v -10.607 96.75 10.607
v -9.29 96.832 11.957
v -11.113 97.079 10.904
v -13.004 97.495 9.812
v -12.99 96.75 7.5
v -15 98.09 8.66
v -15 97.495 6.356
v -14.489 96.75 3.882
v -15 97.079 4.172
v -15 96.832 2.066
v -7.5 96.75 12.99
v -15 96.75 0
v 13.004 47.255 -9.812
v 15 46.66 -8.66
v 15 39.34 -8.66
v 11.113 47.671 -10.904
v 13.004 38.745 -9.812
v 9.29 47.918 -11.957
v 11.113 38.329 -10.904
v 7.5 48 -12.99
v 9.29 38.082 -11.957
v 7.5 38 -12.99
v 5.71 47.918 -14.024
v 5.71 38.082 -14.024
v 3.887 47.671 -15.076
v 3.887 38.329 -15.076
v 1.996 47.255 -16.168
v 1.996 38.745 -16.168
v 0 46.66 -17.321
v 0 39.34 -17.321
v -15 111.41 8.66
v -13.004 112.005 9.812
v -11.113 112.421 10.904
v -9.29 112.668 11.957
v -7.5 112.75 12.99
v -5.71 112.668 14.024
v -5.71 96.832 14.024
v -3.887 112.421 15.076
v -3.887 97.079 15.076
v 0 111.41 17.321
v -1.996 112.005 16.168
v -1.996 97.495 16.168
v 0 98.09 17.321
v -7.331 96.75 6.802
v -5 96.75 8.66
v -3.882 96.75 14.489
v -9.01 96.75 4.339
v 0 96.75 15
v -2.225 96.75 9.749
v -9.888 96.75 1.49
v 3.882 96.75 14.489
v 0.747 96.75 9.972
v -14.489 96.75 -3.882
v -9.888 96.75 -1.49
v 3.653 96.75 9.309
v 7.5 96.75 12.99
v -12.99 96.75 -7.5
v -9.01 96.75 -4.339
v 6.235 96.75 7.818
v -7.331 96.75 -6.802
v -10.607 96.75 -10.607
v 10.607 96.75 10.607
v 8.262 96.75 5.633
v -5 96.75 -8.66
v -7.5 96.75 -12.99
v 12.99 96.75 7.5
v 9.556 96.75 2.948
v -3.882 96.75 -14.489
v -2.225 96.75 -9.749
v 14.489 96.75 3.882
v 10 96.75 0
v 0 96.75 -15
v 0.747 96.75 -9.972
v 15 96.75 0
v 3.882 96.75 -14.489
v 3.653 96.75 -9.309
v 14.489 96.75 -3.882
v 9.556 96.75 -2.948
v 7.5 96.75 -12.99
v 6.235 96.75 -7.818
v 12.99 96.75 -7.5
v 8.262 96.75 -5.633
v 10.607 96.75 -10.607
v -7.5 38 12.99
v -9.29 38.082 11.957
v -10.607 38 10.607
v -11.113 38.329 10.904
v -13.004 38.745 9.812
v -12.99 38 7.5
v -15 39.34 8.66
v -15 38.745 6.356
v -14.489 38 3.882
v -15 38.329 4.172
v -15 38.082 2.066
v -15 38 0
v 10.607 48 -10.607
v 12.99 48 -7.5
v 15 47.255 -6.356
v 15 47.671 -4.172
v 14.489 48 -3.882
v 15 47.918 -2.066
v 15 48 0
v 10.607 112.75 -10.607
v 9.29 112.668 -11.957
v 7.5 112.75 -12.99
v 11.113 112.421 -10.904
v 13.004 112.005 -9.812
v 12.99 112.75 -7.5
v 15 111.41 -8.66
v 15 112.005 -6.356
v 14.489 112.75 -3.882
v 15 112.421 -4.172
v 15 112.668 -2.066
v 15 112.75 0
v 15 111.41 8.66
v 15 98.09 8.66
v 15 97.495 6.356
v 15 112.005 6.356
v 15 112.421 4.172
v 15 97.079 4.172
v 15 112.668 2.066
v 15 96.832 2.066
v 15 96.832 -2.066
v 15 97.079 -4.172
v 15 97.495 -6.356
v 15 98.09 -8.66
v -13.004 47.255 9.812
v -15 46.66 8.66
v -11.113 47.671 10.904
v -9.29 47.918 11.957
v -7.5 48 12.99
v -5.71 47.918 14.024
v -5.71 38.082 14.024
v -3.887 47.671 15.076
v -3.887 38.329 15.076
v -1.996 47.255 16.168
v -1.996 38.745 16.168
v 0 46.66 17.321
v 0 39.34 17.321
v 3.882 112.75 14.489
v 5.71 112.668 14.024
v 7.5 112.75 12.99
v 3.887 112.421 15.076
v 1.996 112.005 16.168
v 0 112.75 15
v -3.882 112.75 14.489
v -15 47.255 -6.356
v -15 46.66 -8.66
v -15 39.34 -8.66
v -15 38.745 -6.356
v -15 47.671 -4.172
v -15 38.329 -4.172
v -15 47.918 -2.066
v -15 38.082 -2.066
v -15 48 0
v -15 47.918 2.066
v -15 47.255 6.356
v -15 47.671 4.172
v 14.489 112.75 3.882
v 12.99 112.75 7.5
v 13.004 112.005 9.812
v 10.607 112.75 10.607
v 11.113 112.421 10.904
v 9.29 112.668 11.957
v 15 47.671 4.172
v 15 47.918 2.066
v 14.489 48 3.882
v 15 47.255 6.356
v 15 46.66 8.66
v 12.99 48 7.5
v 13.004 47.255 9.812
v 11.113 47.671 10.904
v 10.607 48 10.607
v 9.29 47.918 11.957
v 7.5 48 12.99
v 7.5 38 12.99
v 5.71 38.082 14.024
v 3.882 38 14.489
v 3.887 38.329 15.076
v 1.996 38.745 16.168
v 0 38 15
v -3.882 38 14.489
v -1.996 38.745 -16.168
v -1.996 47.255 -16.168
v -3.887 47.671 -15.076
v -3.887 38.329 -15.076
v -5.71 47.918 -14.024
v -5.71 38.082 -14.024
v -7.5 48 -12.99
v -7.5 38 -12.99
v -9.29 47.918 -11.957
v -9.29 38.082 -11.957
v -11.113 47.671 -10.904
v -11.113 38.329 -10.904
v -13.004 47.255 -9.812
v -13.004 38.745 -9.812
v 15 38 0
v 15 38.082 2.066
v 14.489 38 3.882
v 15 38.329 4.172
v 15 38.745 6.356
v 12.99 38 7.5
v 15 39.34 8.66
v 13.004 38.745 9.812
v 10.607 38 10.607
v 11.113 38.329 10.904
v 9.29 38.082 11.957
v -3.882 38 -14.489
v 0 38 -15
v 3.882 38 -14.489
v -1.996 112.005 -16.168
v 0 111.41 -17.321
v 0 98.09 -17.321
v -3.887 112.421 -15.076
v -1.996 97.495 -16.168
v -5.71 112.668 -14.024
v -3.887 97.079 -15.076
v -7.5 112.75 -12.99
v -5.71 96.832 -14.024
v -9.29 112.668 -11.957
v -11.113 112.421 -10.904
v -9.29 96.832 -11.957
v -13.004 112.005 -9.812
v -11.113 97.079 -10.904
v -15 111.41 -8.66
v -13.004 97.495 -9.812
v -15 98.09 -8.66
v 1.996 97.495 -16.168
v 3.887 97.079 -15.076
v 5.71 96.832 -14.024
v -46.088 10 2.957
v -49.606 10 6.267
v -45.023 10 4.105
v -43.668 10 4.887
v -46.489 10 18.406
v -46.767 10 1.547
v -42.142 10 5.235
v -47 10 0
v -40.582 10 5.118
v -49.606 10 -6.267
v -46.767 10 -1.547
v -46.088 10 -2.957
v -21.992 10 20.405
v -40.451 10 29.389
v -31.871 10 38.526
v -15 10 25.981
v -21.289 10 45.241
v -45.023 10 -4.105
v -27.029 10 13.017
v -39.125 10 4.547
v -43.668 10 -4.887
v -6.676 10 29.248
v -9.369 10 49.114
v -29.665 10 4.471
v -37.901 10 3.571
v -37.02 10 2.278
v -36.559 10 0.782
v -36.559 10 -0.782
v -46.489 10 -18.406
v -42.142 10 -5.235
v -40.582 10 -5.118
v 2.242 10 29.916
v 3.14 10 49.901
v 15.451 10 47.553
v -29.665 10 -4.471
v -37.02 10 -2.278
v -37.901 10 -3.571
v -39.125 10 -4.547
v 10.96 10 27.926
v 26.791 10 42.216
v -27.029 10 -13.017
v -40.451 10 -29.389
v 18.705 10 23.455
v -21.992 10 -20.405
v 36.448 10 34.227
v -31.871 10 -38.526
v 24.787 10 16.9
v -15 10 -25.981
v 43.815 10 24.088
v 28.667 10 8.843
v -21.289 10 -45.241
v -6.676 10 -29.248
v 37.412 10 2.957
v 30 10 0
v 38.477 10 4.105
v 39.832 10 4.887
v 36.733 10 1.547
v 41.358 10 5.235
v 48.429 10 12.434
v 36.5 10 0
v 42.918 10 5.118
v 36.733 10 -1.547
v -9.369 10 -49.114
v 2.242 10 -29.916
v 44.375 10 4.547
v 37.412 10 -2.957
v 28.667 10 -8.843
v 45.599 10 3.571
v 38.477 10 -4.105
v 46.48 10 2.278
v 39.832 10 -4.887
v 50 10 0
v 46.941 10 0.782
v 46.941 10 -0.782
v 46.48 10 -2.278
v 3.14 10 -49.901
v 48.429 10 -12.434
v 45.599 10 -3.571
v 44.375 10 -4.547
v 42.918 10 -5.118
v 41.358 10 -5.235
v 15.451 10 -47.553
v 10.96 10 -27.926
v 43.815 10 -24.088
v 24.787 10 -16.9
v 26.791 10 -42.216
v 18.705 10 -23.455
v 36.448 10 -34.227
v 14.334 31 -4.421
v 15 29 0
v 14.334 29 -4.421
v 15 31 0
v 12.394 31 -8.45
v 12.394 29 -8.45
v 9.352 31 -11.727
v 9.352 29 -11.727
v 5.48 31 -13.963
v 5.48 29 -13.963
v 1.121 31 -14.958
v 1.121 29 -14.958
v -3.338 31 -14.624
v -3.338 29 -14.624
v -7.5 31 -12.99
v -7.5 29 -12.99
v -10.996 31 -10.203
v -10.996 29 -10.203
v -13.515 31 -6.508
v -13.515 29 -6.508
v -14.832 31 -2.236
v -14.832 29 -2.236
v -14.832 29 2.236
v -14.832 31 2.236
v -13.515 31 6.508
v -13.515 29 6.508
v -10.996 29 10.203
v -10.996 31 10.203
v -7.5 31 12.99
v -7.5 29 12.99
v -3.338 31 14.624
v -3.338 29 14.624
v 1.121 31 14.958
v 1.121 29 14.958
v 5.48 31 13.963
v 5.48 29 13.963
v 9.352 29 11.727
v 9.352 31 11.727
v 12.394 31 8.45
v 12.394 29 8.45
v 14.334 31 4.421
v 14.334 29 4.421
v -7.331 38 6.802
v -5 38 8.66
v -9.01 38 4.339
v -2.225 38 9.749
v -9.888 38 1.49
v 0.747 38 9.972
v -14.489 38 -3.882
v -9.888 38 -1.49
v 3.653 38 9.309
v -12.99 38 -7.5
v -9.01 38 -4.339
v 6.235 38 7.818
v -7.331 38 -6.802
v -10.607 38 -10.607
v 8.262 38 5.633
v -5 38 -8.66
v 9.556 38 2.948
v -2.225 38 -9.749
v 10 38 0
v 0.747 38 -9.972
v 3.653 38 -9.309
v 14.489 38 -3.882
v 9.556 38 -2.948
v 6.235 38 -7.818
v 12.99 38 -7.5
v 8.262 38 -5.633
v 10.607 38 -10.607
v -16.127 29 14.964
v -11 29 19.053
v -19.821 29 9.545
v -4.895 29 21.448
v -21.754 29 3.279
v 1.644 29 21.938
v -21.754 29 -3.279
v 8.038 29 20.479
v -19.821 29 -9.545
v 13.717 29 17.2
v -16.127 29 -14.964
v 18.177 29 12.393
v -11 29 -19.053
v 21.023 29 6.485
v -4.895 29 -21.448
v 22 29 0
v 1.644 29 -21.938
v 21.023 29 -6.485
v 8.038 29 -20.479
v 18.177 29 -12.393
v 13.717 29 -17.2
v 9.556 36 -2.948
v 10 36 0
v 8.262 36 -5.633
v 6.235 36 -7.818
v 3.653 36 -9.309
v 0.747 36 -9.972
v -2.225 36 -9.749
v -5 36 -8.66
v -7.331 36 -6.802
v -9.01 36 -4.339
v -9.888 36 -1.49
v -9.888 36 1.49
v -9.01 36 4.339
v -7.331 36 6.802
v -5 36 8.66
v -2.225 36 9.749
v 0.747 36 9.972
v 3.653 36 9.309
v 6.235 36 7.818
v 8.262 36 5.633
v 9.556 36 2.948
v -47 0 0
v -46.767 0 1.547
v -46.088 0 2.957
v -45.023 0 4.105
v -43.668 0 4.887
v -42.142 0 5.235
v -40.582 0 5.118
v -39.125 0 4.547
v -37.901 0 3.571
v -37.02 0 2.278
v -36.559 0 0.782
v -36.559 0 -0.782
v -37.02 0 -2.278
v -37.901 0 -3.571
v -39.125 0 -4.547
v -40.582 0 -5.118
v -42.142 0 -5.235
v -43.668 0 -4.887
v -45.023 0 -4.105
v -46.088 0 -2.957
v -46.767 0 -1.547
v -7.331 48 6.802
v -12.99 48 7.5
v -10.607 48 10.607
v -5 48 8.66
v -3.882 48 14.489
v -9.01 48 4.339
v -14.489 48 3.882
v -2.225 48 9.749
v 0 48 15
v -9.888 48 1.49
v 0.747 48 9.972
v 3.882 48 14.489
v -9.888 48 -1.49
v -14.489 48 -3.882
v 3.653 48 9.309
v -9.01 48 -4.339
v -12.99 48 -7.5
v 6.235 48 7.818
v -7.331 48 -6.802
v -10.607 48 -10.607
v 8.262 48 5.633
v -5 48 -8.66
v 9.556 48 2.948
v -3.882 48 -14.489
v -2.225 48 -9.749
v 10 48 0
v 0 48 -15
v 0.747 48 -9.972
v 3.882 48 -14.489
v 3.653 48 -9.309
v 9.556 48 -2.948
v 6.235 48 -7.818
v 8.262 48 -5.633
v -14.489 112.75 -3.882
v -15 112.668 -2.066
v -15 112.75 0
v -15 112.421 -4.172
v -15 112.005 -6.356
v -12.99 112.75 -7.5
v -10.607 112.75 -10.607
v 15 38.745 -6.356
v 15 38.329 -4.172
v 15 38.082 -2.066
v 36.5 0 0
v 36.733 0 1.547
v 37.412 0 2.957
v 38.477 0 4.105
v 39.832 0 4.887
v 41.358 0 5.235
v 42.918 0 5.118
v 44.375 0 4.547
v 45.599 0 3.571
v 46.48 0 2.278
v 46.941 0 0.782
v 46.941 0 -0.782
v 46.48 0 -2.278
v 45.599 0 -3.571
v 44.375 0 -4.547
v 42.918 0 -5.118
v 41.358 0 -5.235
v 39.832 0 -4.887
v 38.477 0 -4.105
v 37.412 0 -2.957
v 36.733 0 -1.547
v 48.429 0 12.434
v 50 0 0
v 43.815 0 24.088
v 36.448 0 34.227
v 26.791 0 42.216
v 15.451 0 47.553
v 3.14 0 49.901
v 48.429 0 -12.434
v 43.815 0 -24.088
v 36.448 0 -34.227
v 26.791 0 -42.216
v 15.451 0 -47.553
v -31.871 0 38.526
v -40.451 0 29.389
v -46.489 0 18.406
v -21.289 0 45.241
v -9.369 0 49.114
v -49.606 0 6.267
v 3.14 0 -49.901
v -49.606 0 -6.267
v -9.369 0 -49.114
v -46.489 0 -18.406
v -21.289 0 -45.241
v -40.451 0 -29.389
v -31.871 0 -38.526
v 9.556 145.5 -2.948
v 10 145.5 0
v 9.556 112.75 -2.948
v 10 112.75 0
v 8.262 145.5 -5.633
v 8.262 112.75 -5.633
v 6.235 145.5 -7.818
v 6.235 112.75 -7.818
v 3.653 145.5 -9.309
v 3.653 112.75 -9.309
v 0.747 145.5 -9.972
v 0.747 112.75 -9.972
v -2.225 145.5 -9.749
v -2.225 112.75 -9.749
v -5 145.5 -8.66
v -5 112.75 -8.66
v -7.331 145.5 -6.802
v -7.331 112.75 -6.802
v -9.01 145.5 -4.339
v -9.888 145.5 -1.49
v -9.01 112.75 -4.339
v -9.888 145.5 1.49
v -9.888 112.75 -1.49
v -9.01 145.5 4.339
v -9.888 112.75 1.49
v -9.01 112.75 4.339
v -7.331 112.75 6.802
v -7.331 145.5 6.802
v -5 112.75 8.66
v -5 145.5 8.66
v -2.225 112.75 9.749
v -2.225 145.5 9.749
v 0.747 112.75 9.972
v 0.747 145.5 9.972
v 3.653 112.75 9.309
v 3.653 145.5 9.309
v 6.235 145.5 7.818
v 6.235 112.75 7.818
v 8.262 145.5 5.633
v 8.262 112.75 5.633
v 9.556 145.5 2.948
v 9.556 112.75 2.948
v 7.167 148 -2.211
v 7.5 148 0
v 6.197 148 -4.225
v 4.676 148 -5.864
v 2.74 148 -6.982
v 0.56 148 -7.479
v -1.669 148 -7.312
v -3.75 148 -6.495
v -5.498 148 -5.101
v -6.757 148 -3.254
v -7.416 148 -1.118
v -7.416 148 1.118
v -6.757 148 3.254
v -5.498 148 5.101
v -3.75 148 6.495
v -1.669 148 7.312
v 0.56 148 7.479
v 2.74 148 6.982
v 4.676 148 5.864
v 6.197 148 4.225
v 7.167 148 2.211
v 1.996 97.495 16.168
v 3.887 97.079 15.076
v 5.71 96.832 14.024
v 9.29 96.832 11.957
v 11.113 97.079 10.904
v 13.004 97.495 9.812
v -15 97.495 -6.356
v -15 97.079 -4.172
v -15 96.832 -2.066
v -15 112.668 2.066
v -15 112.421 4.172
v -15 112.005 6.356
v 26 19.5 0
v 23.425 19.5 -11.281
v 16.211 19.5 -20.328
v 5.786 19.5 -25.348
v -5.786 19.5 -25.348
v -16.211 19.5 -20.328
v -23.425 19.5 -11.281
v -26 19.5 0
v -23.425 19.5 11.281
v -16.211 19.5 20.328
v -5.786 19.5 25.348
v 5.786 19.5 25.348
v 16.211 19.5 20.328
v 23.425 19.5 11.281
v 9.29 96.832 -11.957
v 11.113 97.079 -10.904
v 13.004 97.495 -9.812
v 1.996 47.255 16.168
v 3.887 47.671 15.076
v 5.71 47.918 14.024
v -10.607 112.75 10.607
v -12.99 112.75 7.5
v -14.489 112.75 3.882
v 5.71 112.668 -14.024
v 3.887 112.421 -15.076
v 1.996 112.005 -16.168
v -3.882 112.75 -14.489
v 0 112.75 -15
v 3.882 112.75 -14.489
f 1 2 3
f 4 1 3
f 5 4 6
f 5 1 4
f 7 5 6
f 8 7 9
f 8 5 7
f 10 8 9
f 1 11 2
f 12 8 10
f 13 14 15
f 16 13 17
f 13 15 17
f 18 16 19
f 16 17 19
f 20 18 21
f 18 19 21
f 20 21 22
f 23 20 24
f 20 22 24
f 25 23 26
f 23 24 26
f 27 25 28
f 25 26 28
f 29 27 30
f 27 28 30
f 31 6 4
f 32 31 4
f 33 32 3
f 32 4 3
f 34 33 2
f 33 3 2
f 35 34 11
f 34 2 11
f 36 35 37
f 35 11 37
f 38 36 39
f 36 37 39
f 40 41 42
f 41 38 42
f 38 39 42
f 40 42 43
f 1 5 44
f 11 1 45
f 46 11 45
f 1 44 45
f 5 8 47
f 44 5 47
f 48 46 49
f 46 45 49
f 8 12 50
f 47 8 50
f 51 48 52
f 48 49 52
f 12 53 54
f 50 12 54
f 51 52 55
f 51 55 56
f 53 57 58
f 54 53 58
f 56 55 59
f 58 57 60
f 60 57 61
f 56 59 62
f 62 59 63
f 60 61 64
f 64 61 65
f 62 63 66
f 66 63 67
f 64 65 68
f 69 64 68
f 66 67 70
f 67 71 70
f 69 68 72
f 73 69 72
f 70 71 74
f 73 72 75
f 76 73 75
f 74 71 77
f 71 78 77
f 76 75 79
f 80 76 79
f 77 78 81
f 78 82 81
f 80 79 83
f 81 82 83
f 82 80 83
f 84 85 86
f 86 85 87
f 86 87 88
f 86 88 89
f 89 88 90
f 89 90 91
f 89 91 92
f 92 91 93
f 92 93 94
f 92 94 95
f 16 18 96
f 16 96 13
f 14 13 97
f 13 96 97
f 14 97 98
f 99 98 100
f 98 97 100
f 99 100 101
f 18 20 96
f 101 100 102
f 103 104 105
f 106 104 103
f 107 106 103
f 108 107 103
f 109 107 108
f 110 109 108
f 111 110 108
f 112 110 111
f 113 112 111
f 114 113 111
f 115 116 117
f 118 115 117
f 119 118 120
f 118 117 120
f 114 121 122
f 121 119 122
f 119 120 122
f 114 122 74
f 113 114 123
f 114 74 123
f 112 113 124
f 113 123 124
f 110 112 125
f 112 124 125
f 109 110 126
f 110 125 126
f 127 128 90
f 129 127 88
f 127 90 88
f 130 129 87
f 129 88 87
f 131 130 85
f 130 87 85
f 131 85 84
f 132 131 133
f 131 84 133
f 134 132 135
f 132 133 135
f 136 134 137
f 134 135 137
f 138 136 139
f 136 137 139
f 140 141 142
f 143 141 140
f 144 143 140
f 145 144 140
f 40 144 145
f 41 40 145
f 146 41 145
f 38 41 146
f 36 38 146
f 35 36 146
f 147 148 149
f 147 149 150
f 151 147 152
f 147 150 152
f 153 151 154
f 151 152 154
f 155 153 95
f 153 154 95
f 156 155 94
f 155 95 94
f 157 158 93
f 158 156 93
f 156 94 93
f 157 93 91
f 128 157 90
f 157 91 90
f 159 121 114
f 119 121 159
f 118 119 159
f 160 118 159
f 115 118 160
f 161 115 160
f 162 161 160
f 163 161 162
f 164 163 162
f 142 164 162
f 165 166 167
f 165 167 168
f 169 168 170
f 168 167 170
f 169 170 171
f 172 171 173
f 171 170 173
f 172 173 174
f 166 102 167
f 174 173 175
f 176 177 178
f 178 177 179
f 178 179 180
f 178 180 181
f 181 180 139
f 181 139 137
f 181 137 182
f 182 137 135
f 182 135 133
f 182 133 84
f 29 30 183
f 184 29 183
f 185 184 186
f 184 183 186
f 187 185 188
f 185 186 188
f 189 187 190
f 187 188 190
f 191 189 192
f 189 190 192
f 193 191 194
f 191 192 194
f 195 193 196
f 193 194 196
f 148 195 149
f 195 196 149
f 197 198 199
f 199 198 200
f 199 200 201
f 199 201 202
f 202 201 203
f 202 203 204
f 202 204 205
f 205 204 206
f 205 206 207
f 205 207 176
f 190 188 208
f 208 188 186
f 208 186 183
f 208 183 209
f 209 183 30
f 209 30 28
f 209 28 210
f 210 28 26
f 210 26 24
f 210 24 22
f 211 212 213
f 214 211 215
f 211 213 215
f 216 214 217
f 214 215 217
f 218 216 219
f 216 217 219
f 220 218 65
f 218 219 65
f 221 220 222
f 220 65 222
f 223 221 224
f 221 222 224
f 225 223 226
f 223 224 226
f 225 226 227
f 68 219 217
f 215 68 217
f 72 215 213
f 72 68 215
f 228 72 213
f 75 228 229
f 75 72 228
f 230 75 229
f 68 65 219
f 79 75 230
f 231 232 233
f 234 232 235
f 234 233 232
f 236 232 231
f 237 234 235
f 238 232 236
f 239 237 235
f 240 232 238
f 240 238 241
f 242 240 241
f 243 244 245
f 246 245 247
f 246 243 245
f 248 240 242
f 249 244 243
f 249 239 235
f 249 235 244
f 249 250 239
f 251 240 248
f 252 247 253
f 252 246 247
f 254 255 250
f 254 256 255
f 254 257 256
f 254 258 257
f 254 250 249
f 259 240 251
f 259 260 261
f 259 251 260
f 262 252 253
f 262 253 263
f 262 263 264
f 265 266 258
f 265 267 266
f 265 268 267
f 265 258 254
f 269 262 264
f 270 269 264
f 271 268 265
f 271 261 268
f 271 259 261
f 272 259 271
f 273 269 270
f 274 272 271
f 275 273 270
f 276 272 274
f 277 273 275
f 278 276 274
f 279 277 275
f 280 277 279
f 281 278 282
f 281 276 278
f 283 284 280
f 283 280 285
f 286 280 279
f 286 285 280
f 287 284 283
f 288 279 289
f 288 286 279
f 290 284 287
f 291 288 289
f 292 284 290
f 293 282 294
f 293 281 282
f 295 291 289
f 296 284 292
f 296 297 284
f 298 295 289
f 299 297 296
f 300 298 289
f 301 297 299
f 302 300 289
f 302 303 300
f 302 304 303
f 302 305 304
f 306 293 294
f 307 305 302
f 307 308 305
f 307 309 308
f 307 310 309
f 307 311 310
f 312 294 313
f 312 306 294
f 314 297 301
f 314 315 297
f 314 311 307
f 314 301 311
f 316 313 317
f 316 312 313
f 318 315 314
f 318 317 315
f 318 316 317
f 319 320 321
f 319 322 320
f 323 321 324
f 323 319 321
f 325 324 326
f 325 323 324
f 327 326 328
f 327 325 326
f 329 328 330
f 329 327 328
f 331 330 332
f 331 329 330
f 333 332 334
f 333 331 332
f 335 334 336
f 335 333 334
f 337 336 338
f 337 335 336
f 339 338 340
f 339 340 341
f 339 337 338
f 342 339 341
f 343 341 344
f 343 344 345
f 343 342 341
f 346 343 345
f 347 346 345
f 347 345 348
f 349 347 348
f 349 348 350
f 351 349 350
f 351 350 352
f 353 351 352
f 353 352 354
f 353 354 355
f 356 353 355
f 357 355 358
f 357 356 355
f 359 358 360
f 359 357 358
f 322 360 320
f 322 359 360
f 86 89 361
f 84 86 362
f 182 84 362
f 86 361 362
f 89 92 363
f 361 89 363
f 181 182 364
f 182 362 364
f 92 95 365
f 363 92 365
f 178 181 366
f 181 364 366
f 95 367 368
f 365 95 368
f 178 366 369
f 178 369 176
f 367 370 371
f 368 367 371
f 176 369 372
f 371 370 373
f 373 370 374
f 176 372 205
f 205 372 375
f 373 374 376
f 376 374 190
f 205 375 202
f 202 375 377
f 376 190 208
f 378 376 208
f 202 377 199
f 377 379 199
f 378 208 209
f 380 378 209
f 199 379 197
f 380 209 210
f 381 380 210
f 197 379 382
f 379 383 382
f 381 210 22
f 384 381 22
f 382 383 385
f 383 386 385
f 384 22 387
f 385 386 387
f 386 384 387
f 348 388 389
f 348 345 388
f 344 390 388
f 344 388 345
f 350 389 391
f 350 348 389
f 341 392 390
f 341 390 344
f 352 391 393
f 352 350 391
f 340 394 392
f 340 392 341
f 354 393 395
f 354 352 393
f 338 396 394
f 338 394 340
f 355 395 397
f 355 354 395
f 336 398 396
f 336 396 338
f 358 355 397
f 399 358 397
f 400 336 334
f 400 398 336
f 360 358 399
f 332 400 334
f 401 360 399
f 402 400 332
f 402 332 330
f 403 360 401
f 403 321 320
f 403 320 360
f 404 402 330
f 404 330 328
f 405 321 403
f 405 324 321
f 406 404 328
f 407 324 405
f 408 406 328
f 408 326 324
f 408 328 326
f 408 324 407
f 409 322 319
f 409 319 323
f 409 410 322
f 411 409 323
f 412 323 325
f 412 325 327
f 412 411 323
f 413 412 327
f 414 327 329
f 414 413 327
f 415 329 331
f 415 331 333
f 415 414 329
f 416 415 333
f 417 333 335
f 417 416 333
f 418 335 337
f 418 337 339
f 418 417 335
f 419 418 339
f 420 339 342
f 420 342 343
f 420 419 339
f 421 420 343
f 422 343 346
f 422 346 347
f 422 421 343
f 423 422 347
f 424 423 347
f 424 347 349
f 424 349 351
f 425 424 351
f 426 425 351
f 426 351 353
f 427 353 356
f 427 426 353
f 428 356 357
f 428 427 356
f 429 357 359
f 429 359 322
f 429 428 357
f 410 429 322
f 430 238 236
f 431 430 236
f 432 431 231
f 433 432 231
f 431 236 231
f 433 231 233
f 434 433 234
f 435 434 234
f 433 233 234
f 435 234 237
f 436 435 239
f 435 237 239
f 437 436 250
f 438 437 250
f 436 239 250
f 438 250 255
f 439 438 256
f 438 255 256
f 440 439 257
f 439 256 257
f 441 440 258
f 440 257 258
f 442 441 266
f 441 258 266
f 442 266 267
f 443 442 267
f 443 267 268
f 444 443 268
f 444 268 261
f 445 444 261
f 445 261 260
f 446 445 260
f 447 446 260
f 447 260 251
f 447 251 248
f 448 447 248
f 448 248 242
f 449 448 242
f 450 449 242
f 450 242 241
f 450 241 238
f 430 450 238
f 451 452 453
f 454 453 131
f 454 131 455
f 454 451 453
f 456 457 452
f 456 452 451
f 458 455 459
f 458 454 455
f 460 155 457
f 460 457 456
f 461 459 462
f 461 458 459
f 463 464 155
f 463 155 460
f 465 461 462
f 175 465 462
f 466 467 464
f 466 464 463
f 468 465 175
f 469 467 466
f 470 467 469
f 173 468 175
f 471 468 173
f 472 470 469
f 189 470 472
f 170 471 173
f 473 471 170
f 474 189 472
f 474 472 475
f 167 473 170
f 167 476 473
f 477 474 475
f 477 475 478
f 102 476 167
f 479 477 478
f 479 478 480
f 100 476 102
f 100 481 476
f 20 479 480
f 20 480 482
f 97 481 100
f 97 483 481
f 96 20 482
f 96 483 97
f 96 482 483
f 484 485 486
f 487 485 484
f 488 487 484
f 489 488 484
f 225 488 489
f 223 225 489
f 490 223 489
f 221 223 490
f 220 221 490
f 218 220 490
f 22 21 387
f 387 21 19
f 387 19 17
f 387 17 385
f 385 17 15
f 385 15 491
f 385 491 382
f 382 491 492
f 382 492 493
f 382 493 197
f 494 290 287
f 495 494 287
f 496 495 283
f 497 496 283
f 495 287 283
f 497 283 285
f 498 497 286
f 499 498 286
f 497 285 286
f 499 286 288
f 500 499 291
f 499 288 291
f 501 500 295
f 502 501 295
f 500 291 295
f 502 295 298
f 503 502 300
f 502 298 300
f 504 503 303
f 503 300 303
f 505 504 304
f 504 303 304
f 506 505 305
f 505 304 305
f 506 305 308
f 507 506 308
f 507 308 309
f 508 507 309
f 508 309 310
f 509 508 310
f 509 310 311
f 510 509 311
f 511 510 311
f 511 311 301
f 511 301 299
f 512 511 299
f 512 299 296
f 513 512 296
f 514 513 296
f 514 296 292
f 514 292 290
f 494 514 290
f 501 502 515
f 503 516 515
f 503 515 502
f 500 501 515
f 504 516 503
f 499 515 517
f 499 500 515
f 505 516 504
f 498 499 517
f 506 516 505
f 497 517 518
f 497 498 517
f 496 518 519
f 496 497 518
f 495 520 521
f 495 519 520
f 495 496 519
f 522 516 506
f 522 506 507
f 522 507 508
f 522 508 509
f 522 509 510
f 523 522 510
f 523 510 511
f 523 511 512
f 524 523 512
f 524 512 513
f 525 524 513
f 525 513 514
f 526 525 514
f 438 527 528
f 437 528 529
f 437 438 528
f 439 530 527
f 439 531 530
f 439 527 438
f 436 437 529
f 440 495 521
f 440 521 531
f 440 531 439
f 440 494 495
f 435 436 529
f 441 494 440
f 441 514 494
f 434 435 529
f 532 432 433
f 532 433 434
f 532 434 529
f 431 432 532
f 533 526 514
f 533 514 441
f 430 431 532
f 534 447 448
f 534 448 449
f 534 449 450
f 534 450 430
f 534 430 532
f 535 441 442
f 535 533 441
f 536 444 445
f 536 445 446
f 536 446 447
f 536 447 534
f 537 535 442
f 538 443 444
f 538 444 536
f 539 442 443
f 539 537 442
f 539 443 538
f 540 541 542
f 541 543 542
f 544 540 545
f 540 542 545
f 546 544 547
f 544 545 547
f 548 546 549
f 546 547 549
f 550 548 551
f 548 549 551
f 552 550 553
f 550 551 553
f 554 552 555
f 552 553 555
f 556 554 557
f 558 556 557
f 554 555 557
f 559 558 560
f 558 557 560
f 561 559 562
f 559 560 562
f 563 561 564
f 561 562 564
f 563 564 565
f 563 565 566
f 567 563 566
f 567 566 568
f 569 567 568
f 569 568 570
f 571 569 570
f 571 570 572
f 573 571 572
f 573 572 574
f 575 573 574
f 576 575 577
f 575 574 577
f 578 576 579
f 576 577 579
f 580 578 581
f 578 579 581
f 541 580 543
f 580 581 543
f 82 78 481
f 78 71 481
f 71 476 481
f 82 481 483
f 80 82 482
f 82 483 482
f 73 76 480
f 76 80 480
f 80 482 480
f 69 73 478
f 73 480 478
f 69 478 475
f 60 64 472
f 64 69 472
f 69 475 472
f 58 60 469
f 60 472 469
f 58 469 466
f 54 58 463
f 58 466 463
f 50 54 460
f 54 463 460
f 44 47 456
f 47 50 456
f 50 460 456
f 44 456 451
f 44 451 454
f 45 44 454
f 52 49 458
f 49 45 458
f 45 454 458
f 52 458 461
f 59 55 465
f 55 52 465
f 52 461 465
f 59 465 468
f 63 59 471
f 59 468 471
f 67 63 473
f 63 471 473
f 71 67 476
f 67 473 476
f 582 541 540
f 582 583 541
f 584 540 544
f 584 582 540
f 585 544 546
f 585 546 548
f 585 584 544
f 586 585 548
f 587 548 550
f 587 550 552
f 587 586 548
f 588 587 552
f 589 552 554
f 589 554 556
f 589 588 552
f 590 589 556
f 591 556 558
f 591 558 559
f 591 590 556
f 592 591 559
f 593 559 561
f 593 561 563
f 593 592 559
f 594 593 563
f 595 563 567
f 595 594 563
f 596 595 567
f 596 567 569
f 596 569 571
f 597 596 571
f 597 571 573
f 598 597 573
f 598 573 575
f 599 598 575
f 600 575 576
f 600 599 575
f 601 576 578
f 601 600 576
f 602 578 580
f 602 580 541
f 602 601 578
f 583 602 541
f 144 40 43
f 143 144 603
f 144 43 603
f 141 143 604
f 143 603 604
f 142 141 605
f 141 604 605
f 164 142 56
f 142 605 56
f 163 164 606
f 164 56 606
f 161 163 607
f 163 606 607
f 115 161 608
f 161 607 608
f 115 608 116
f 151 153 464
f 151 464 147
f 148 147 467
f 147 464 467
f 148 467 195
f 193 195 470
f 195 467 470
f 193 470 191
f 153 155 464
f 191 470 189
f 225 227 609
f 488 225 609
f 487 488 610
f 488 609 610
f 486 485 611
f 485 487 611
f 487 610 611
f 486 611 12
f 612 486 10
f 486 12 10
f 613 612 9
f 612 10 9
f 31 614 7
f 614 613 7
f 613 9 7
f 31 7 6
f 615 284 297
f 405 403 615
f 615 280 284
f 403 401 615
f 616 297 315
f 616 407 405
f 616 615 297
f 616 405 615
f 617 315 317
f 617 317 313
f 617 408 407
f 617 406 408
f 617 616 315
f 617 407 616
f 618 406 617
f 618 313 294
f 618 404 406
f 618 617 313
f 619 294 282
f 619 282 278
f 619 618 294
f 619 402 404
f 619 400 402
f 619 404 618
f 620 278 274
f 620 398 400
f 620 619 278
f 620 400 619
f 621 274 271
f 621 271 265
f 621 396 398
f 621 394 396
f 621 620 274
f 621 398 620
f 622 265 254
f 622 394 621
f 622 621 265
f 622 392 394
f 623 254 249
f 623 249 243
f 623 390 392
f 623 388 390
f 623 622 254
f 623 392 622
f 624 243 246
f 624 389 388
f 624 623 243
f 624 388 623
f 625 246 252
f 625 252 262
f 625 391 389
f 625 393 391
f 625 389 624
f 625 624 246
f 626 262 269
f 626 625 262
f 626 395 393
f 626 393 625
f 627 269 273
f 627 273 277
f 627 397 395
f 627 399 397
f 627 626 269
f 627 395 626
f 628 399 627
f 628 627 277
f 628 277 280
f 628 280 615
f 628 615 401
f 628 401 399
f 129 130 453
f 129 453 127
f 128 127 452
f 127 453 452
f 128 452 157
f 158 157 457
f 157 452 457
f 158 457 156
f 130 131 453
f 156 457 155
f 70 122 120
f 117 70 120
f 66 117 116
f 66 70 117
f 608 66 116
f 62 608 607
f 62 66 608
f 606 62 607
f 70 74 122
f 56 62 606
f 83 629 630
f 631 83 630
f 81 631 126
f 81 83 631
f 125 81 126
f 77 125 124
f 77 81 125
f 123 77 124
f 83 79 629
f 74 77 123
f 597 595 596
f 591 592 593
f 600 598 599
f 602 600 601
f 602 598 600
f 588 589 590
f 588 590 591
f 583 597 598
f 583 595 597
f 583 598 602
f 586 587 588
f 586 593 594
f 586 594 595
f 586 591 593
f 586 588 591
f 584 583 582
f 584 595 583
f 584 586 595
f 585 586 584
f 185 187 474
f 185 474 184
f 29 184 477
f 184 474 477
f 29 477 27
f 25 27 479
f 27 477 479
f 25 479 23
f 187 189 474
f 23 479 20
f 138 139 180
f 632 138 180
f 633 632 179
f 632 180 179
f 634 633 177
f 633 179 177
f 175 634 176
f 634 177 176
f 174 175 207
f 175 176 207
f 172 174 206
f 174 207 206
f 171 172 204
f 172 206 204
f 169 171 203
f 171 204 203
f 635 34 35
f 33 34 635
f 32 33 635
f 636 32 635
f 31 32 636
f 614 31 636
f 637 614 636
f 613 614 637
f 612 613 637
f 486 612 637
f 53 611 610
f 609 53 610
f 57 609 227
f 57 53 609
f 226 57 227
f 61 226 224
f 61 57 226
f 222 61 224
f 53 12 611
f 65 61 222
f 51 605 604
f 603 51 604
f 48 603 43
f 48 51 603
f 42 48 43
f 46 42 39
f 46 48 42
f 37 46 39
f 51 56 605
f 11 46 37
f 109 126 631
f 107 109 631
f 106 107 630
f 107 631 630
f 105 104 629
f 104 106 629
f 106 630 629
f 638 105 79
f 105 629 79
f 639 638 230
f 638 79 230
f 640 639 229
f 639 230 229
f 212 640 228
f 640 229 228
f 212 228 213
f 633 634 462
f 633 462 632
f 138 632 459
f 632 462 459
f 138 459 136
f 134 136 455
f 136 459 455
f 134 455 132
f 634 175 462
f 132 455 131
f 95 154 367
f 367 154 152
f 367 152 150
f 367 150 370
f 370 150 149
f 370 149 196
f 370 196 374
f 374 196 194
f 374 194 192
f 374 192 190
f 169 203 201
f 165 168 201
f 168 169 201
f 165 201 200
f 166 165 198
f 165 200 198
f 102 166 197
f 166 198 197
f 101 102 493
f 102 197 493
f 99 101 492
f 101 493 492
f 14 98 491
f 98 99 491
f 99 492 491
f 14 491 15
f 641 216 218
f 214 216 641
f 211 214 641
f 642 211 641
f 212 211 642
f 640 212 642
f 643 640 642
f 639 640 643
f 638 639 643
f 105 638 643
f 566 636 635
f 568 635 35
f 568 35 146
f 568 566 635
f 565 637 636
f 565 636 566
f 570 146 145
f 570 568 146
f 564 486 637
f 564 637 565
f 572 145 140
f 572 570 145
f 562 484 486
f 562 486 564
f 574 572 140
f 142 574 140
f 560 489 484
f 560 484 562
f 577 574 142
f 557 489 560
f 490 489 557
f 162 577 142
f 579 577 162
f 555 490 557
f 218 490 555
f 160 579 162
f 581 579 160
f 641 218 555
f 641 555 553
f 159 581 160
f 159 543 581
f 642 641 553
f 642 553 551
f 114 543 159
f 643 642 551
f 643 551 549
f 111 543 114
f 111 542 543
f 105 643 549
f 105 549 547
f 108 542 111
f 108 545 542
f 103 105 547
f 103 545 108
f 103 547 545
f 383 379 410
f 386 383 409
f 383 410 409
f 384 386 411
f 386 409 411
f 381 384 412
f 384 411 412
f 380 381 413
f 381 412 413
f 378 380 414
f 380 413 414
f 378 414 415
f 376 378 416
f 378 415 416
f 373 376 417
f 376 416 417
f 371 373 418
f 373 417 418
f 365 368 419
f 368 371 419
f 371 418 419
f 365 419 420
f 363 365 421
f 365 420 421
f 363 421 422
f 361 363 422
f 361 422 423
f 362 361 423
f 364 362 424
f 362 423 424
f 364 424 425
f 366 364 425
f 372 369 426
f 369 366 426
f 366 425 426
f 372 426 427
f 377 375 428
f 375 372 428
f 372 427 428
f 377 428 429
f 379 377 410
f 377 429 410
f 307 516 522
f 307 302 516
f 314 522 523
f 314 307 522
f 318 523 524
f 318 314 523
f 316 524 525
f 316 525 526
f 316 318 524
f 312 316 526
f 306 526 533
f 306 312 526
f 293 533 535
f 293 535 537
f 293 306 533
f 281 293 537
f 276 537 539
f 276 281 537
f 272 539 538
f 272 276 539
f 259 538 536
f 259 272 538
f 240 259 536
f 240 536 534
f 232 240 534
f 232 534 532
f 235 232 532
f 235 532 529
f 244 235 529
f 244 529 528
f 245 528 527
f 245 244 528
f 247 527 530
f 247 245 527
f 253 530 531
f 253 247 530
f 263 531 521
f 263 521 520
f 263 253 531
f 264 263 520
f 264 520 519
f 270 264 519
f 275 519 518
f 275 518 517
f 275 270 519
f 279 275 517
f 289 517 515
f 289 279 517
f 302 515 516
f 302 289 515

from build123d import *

# Parameters (mm, degrees)
EXTRUDE_1_DEPTH     = 10
EXTRUDE_2_DEPTH     = 16
SKETCH_5_R          = 5.25
CUT_EXTRUDE_1_DEPTH = 11


with BuildPart() as part:
    # Эскиз1 → Повернуть1 (revolve)
    with BuildSketch(Plane.XY, mode=Mode.PRIVATE) as revolve_1_sk:
        Polygon((0, 0), (-50, 0), (-50, 10), (-30, 10), (-22, 29), (-15, 29), (-15, 31), (-10, 36), (-10, 38), (-10, 48), (-10, 145.5), (-7.5, 148), (0, 148), align=None)
    revolve(revolve_1_sk.sketch.rotate(Axis((0, 0, 0), (0, 1, 0)), 180), axis=Axis((0, 0, 0), (0, 1, 0)))  # turned: the seam where the file's is

    # Эскиз2 → Бобышка-Вытянуть1 (add)
    with BuildSketch(Plane(origin=(0, 38, 0), x_dir=(1, 0, 0), z_dir=(0, 1, 0))):
        Polygon((0, 17.320508076), (-15, 8.660254038), (-15, -8.660254038), (0, -17.320508076), (15, -8.660254038), (15, 8.660254038), align=None)
    extrude(amount=EXTRUDE_1_DEPTH)

    # Эскиз3 → Бобышка-Вытянуть2 (add)
    with BuildSketch(Plane(origin=(0, 96.75, 0), x_dir=(1, 0, 0), z_dir=(0, 1, 0))):
        Polygon((15, 8.660254038), (0, 17.320508076), (-15, 8.660254038), (-15, -8.660254038), (0, -17.320508076), (15, -8.660254038), align=None)
    extrude(amount=EXTRUDE_2_DEPTH)

    # Эскиз4 → Вырез-Повернуть2 (revolve, cut)
    with BuildSketch(Plane.XY, mode=Mode.PRIVATE) as cut_revolve_2_sk:
        Polygon((-28.856406461, 112.75), (-15, 112.75), (-28.856406461, 104.75), align=None)
        Polygon((-28.856406461, 96.75), (-28.856406461, 104.75), (-15, 96.75), align=None)
        Polygon((-23.660254038, 48), (-23.660254038, 43), (-15, 48), align=None)
        Polygon((-23.660254038, 43), (-23.660254038, 38), (-15, 38), align=None)
    revolve(cut_revolve_2_sk.sketch.rotate(Axis((0, 148, 0), (0, -1, 0)), 180), axis=Axis((0, 148, 0), (0, -1, 0)), mode=Mode.SUBTRACT)  # turned: the seam where the file's is

    # Эскиз5 → Вырез-Вытянуть1 (cut, through all)
    with BuildSketch(Plane(origin=(0, 10, 0), x_dir=(1, 0, 0), z_dir=(0, 1, 0))):
        with Locations(Location((-41.75, 0, 0), (0, 0, 180))):  # turned: the seam where the file's is
            Circle(SKETCH_5_R)
        with Locations(Location((41.75, 0, 0), (0, 0, 180))):  # turned: the seam where the file's is
            Circle(SKETCH_5_R)
    extrude(amount=-CUT_EXTRUDE_1_DEPTH, mode=Mode.SUBTRACT)


solid = part.part
